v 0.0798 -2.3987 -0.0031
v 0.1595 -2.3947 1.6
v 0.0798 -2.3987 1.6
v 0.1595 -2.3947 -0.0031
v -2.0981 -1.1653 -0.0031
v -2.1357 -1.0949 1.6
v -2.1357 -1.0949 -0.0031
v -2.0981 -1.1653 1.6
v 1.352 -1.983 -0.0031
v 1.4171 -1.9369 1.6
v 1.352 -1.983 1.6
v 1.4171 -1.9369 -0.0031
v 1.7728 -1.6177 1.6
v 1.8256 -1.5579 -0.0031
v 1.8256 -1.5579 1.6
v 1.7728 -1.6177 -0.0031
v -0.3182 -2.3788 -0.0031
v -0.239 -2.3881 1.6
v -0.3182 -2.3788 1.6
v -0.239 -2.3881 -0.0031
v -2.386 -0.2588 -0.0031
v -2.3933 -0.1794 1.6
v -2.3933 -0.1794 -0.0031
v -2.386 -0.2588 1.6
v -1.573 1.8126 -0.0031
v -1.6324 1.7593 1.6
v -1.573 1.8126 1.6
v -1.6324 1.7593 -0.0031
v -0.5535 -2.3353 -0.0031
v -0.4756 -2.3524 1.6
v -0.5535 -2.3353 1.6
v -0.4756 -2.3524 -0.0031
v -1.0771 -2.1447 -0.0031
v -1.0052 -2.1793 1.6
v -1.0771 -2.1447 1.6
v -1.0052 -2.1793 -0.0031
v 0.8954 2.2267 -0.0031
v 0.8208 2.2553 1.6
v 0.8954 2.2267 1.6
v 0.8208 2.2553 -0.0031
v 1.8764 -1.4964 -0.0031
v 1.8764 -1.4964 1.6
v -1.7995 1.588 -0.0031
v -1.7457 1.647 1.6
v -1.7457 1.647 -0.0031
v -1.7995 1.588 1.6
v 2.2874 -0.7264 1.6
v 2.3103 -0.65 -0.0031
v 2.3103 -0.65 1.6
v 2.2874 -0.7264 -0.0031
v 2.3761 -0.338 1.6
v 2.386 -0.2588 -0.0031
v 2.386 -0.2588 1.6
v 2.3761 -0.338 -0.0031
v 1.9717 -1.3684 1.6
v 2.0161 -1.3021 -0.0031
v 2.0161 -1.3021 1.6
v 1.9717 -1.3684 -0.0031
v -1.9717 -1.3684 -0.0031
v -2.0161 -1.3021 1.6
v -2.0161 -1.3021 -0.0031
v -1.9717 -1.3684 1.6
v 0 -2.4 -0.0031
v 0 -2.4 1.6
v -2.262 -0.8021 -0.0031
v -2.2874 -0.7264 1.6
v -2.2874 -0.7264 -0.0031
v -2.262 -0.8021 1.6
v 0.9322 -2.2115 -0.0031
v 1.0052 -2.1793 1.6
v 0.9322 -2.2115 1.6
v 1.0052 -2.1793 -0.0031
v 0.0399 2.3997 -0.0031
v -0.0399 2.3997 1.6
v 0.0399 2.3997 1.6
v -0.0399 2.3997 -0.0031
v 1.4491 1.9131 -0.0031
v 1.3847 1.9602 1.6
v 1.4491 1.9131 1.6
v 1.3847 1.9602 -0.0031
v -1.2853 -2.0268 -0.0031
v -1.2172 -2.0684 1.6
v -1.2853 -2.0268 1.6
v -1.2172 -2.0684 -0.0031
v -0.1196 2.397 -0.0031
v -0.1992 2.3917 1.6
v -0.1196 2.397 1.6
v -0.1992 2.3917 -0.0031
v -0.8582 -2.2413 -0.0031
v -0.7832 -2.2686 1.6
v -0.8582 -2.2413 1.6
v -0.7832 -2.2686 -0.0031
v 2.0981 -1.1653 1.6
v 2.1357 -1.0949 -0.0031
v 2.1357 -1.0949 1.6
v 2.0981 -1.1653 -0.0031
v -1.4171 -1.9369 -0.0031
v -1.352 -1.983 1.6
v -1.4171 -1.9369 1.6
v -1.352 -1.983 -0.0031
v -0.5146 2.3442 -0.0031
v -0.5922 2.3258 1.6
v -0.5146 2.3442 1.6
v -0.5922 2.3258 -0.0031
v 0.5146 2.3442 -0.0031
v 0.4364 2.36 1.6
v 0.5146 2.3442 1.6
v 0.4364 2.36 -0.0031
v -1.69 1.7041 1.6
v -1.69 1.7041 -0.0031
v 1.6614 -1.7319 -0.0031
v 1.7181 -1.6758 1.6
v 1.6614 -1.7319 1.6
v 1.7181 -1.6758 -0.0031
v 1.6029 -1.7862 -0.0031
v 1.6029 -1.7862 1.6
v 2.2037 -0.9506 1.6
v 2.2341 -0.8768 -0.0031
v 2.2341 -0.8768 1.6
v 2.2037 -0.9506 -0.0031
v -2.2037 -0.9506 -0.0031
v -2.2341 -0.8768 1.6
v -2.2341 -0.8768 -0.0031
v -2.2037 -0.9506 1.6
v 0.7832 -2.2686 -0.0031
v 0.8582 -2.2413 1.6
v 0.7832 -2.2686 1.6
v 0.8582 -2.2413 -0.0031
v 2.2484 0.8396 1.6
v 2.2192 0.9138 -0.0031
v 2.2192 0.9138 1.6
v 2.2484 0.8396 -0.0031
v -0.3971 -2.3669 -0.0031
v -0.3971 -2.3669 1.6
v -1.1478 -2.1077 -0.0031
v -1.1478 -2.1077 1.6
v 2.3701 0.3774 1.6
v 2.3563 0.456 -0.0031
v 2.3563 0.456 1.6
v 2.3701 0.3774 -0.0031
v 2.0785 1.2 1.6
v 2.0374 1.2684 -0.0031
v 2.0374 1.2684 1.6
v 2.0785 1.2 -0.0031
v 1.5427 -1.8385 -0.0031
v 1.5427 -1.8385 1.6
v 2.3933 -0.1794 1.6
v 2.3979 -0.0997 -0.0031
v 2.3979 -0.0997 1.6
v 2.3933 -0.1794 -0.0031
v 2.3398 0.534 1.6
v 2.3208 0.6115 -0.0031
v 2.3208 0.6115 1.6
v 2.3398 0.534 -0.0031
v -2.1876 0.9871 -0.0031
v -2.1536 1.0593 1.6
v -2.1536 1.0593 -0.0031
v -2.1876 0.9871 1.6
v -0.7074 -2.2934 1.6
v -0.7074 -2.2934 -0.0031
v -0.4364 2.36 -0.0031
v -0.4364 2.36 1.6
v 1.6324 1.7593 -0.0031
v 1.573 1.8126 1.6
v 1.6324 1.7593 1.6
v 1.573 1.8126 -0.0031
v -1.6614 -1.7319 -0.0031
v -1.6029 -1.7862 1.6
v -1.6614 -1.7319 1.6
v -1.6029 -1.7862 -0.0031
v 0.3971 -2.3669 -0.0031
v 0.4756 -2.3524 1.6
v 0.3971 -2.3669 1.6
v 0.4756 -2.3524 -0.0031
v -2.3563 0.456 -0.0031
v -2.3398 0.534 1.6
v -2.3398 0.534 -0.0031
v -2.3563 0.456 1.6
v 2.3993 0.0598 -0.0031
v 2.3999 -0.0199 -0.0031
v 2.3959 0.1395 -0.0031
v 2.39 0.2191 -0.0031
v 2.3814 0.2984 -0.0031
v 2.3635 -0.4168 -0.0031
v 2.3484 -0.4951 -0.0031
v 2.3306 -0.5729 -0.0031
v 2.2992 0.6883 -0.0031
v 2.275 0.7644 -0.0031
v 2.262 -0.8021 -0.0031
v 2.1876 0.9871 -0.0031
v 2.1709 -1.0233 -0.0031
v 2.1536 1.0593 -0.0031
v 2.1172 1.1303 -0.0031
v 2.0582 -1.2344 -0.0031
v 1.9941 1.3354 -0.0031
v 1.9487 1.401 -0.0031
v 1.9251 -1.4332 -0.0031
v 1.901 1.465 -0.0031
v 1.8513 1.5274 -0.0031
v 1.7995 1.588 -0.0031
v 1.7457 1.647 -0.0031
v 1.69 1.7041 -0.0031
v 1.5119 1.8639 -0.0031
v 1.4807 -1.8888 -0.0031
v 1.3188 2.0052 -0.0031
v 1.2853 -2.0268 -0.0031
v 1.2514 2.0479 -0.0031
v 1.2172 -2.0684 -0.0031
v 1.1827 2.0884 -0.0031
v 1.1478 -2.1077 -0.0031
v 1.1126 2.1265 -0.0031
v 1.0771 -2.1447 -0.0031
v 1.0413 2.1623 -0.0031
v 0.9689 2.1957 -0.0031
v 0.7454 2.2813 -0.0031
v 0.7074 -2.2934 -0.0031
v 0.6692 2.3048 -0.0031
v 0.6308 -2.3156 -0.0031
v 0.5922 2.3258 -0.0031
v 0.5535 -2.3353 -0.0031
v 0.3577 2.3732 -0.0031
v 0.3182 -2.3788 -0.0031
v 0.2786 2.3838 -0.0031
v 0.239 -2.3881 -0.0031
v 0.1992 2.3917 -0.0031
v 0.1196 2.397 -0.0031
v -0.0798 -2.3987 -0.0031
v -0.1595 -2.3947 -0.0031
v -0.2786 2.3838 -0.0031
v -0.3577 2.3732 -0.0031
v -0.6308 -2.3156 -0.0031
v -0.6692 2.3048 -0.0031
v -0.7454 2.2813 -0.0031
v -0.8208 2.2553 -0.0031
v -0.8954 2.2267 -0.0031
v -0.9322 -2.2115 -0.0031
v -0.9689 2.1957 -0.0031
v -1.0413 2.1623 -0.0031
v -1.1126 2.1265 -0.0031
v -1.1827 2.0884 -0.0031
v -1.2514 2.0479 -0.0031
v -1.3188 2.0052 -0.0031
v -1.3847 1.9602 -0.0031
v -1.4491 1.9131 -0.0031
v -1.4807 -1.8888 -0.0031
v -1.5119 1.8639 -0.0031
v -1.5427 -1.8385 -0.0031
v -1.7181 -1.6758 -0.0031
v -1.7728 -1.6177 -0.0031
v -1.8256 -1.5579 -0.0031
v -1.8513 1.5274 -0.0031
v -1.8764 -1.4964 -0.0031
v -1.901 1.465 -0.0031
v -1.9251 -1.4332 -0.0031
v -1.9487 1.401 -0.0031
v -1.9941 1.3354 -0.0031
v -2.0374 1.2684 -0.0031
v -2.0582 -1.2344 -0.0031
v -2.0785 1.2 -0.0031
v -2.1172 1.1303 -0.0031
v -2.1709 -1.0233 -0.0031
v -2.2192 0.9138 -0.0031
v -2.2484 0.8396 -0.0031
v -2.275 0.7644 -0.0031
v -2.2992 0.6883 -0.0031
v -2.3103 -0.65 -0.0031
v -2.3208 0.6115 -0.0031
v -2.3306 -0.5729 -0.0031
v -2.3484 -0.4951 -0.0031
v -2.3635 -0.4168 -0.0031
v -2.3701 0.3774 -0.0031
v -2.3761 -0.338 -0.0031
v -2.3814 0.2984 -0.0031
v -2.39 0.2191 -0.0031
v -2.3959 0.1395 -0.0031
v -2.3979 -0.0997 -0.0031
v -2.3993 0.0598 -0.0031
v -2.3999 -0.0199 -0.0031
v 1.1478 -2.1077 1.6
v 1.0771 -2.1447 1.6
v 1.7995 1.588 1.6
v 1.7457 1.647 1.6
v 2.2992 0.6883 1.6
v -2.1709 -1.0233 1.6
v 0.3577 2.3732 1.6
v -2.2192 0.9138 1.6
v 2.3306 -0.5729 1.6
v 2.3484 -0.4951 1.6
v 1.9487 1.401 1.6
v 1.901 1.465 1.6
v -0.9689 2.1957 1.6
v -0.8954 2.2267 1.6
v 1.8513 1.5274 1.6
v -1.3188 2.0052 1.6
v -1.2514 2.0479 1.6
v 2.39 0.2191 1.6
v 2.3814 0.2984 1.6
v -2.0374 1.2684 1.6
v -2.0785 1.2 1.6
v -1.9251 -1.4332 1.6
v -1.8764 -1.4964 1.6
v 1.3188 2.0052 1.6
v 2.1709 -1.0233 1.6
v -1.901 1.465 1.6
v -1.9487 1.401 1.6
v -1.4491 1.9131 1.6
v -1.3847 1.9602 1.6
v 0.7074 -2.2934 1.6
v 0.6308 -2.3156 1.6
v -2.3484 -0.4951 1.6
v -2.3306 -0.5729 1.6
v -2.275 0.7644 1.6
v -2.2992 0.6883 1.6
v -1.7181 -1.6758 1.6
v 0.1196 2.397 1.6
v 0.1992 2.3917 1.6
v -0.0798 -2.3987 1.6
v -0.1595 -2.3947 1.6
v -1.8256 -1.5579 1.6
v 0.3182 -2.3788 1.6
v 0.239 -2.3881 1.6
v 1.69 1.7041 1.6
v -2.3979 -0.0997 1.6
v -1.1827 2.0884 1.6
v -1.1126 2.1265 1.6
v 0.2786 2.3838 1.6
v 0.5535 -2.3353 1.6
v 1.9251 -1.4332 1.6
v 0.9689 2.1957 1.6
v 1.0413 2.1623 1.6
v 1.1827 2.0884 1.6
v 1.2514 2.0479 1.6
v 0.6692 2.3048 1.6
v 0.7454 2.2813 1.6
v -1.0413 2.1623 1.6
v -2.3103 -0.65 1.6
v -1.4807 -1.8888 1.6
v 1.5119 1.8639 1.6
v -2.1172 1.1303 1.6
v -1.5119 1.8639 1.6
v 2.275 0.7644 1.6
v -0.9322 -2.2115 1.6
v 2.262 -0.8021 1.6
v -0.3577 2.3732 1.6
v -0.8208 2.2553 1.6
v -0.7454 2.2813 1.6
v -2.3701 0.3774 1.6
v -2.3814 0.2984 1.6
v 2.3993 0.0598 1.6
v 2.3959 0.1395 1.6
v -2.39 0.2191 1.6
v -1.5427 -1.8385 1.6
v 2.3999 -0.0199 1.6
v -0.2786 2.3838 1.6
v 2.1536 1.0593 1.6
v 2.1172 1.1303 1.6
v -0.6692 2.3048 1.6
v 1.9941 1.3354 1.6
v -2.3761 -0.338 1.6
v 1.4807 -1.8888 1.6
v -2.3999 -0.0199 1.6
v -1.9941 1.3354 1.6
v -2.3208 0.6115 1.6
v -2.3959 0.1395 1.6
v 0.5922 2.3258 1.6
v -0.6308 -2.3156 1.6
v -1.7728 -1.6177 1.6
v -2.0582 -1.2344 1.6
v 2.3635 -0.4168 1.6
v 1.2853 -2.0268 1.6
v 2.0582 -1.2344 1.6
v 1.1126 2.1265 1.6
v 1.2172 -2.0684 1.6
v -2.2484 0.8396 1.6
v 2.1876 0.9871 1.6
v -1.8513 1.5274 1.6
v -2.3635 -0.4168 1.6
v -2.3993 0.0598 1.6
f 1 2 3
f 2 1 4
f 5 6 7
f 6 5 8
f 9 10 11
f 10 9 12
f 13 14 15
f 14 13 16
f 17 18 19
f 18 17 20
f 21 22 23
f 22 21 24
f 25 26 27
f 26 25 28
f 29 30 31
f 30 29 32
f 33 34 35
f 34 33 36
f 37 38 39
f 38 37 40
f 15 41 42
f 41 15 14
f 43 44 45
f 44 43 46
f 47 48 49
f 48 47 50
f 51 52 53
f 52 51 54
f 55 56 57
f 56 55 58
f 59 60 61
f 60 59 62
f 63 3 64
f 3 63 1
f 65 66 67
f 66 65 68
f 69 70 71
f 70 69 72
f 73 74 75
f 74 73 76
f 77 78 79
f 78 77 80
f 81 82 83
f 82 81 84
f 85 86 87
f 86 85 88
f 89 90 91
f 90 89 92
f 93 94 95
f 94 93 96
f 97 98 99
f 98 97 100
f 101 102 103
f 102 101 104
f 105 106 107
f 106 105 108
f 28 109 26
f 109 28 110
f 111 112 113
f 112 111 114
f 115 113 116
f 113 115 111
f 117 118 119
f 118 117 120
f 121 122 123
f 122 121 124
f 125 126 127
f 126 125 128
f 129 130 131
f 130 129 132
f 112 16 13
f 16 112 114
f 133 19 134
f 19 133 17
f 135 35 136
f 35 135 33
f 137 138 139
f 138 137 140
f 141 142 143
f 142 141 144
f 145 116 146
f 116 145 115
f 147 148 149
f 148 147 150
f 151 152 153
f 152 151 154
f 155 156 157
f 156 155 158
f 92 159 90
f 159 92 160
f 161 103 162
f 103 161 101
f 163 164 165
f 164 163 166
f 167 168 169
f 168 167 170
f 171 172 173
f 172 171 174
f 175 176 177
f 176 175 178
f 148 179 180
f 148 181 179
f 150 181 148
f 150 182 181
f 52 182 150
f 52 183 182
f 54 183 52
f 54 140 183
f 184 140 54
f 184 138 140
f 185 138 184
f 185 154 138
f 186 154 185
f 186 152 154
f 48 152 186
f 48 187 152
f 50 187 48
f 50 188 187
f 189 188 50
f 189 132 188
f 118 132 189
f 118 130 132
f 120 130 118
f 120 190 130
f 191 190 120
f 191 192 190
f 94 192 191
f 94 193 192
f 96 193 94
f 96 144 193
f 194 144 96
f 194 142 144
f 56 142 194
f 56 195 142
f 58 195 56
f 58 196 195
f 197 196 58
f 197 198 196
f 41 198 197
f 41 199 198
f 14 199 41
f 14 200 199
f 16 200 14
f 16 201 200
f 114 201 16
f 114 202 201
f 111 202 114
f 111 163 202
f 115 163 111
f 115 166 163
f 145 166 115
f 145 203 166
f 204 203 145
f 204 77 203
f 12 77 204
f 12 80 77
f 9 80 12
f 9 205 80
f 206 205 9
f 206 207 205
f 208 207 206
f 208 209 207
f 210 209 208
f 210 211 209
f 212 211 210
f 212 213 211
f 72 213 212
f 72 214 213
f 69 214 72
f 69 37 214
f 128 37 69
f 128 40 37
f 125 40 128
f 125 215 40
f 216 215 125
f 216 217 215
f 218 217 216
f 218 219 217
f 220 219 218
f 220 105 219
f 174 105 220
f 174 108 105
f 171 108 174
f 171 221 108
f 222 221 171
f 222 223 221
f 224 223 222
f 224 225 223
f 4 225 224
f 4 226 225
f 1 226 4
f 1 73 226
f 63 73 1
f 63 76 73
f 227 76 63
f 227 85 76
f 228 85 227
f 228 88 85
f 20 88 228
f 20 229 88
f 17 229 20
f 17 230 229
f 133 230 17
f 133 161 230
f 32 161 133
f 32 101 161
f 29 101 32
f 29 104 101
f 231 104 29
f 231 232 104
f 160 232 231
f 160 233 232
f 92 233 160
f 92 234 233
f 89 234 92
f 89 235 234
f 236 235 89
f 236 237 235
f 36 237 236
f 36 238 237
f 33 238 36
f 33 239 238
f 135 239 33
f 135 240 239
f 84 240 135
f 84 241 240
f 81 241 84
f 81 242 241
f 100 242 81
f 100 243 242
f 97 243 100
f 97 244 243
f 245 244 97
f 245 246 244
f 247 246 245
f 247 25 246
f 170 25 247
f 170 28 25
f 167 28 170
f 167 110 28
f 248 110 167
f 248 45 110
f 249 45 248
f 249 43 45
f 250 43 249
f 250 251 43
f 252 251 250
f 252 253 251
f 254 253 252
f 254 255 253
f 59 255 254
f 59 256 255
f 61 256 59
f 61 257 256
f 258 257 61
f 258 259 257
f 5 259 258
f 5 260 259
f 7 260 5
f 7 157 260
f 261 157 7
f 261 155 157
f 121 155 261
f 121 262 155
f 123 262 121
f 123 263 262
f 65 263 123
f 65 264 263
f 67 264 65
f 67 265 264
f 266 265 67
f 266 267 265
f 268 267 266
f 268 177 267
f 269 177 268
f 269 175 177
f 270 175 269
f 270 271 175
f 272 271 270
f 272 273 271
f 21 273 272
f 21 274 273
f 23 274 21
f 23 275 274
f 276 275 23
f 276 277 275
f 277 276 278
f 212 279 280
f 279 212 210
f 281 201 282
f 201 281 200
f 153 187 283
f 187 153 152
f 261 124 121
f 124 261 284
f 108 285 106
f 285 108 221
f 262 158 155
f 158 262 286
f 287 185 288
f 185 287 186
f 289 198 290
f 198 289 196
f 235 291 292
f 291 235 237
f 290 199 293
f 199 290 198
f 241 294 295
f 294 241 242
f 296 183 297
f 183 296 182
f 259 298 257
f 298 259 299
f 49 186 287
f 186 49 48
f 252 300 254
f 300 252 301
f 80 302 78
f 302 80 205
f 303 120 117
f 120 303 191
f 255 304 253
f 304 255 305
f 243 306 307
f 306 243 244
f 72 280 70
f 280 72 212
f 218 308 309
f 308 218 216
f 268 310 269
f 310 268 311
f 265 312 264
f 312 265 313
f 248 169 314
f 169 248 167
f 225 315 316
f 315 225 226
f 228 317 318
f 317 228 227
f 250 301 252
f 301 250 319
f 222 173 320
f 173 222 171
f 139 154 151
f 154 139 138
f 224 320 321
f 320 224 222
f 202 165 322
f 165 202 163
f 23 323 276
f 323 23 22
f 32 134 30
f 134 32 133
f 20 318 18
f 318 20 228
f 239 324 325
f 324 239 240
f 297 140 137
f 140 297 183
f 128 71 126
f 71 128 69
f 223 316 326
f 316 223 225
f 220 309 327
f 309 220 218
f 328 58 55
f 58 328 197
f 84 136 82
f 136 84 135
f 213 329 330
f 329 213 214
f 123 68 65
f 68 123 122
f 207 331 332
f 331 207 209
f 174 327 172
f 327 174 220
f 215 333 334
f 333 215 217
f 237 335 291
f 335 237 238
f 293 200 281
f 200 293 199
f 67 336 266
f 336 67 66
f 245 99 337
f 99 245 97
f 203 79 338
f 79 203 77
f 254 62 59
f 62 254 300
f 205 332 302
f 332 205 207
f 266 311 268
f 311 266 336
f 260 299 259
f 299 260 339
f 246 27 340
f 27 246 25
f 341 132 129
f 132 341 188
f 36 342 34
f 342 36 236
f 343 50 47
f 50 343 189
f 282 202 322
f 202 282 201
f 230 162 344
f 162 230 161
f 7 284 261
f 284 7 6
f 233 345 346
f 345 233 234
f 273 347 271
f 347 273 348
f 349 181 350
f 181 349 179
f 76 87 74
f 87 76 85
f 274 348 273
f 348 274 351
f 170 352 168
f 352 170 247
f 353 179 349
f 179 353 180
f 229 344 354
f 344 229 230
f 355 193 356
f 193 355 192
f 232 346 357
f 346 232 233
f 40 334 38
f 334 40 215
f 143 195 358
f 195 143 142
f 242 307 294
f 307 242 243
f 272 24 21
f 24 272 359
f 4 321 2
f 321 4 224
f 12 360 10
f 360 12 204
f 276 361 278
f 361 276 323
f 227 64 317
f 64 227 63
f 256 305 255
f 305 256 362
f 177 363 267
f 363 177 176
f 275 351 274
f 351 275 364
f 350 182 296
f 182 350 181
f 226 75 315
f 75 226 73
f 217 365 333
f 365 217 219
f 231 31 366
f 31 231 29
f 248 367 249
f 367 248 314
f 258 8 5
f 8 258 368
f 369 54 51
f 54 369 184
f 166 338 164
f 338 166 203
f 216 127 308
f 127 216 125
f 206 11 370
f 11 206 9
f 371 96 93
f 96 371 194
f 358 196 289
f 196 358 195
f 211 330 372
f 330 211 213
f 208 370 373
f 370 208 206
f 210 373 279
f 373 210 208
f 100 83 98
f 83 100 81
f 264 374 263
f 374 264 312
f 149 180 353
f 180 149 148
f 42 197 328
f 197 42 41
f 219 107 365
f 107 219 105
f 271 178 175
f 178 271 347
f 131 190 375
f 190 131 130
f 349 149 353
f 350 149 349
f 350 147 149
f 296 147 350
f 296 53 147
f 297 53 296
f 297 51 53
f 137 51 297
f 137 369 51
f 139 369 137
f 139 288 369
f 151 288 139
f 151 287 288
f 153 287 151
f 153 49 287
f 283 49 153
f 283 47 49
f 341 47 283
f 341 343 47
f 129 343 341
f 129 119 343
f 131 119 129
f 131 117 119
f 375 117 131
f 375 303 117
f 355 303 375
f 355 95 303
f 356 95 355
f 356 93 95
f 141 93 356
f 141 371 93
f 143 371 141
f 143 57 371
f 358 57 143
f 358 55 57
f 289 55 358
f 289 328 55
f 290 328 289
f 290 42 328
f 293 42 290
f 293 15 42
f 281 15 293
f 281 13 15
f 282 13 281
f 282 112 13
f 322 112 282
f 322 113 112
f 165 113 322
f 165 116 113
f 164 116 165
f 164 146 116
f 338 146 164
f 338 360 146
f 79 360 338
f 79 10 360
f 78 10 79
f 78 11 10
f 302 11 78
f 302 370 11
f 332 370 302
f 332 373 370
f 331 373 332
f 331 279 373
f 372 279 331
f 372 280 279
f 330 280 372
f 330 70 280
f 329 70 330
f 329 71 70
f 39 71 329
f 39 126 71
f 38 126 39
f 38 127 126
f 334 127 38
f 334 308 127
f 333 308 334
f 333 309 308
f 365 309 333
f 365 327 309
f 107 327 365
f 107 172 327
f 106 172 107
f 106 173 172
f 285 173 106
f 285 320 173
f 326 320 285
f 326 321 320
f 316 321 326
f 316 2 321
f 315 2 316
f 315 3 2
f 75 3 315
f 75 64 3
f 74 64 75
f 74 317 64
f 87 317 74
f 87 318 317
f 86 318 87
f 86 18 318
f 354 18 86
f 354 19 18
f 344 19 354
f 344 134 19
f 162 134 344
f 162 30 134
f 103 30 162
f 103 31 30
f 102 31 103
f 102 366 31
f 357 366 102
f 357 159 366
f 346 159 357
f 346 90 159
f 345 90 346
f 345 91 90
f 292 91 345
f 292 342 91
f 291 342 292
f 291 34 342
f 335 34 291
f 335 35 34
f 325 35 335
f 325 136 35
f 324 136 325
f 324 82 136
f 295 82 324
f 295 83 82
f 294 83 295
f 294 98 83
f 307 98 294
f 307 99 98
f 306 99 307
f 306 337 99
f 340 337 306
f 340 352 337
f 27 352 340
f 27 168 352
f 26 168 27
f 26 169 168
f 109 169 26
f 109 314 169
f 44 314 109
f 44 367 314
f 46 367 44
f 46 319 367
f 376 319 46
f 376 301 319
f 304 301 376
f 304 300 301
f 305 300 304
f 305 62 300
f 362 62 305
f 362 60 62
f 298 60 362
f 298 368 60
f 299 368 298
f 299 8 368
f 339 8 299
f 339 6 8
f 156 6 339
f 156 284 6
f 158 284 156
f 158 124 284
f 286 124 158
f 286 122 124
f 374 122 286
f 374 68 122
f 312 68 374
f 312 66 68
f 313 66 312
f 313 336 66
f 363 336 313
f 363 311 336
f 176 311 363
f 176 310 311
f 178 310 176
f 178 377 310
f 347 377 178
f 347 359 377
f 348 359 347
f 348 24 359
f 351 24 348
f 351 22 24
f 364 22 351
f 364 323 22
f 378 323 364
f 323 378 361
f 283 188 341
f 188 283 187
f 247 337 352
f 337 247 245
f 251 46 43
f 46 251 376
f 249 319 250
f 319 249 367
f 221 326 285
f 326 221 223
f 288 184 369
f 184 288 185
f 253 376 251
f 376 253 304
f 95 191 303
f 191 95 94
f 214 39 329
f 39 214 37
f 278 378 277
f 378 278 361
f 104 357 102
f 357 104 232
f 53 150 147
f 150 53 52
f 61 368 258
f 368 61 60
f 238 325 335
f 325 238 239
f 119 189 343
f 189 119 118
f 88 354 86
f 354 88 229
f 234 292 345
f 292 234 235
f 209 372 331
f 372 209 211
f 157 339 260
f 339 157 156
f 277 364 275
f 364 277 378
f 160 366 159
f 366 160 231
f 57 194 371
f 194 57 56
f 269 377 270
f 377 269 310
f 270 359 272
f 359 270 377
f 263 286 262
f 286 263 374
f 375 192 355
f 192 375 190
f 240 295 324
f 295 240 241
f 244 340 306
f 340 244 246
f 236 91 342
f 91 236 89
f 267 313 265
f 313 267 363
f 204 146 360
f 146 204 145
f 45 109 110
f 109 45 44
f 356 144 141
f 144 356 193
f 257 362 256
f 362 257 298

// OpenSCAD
use <../lib.scad>
use <4287a.scad>
$fa=1; $fs=0.2;
function ldraw_lib__4287(realsolid=false) = [
// 0 ~Moved to 4287a
// 0 Name: 4287.dat
// 0 Author: [PTadmin]
// 0 !LDRAW_ORG Part UPDATE 2017-01
// 0 !LICENSE Licensed under CC BY 4.0 : see CAreadme.txt
// 
// 0 BFC CERTIFY CCW
  [0,"BFC","CERTIFY"],
  [0,"BFC","CCW"],
// 
// 0 !HISTORY 2017-12-30 [PTadmin] Official Update 2017-01
// 
// 
// 0 // Slope Brick 33 3 x 1 Inverted with Notch and Thick Front
// 
// 1 16 0 0 0 1 0 0 0 1 0 0 0 1 4287a.dat
  [1,16,0,0,0,1,0,0,0,1,0,0,0,1, ldraw_lib__4287a(realsolid)],
];
module ldraw_lib__4287(step=0, col=false, unit=2/5, alt=false, line=0.2, solid=!$preview)
    makepoly(ldraw_lib__4287(solid), step=step, col=col, unit=unit, alt=alt, line=line, solid=solid);
ldraw_lib__4287(line=0.2);
